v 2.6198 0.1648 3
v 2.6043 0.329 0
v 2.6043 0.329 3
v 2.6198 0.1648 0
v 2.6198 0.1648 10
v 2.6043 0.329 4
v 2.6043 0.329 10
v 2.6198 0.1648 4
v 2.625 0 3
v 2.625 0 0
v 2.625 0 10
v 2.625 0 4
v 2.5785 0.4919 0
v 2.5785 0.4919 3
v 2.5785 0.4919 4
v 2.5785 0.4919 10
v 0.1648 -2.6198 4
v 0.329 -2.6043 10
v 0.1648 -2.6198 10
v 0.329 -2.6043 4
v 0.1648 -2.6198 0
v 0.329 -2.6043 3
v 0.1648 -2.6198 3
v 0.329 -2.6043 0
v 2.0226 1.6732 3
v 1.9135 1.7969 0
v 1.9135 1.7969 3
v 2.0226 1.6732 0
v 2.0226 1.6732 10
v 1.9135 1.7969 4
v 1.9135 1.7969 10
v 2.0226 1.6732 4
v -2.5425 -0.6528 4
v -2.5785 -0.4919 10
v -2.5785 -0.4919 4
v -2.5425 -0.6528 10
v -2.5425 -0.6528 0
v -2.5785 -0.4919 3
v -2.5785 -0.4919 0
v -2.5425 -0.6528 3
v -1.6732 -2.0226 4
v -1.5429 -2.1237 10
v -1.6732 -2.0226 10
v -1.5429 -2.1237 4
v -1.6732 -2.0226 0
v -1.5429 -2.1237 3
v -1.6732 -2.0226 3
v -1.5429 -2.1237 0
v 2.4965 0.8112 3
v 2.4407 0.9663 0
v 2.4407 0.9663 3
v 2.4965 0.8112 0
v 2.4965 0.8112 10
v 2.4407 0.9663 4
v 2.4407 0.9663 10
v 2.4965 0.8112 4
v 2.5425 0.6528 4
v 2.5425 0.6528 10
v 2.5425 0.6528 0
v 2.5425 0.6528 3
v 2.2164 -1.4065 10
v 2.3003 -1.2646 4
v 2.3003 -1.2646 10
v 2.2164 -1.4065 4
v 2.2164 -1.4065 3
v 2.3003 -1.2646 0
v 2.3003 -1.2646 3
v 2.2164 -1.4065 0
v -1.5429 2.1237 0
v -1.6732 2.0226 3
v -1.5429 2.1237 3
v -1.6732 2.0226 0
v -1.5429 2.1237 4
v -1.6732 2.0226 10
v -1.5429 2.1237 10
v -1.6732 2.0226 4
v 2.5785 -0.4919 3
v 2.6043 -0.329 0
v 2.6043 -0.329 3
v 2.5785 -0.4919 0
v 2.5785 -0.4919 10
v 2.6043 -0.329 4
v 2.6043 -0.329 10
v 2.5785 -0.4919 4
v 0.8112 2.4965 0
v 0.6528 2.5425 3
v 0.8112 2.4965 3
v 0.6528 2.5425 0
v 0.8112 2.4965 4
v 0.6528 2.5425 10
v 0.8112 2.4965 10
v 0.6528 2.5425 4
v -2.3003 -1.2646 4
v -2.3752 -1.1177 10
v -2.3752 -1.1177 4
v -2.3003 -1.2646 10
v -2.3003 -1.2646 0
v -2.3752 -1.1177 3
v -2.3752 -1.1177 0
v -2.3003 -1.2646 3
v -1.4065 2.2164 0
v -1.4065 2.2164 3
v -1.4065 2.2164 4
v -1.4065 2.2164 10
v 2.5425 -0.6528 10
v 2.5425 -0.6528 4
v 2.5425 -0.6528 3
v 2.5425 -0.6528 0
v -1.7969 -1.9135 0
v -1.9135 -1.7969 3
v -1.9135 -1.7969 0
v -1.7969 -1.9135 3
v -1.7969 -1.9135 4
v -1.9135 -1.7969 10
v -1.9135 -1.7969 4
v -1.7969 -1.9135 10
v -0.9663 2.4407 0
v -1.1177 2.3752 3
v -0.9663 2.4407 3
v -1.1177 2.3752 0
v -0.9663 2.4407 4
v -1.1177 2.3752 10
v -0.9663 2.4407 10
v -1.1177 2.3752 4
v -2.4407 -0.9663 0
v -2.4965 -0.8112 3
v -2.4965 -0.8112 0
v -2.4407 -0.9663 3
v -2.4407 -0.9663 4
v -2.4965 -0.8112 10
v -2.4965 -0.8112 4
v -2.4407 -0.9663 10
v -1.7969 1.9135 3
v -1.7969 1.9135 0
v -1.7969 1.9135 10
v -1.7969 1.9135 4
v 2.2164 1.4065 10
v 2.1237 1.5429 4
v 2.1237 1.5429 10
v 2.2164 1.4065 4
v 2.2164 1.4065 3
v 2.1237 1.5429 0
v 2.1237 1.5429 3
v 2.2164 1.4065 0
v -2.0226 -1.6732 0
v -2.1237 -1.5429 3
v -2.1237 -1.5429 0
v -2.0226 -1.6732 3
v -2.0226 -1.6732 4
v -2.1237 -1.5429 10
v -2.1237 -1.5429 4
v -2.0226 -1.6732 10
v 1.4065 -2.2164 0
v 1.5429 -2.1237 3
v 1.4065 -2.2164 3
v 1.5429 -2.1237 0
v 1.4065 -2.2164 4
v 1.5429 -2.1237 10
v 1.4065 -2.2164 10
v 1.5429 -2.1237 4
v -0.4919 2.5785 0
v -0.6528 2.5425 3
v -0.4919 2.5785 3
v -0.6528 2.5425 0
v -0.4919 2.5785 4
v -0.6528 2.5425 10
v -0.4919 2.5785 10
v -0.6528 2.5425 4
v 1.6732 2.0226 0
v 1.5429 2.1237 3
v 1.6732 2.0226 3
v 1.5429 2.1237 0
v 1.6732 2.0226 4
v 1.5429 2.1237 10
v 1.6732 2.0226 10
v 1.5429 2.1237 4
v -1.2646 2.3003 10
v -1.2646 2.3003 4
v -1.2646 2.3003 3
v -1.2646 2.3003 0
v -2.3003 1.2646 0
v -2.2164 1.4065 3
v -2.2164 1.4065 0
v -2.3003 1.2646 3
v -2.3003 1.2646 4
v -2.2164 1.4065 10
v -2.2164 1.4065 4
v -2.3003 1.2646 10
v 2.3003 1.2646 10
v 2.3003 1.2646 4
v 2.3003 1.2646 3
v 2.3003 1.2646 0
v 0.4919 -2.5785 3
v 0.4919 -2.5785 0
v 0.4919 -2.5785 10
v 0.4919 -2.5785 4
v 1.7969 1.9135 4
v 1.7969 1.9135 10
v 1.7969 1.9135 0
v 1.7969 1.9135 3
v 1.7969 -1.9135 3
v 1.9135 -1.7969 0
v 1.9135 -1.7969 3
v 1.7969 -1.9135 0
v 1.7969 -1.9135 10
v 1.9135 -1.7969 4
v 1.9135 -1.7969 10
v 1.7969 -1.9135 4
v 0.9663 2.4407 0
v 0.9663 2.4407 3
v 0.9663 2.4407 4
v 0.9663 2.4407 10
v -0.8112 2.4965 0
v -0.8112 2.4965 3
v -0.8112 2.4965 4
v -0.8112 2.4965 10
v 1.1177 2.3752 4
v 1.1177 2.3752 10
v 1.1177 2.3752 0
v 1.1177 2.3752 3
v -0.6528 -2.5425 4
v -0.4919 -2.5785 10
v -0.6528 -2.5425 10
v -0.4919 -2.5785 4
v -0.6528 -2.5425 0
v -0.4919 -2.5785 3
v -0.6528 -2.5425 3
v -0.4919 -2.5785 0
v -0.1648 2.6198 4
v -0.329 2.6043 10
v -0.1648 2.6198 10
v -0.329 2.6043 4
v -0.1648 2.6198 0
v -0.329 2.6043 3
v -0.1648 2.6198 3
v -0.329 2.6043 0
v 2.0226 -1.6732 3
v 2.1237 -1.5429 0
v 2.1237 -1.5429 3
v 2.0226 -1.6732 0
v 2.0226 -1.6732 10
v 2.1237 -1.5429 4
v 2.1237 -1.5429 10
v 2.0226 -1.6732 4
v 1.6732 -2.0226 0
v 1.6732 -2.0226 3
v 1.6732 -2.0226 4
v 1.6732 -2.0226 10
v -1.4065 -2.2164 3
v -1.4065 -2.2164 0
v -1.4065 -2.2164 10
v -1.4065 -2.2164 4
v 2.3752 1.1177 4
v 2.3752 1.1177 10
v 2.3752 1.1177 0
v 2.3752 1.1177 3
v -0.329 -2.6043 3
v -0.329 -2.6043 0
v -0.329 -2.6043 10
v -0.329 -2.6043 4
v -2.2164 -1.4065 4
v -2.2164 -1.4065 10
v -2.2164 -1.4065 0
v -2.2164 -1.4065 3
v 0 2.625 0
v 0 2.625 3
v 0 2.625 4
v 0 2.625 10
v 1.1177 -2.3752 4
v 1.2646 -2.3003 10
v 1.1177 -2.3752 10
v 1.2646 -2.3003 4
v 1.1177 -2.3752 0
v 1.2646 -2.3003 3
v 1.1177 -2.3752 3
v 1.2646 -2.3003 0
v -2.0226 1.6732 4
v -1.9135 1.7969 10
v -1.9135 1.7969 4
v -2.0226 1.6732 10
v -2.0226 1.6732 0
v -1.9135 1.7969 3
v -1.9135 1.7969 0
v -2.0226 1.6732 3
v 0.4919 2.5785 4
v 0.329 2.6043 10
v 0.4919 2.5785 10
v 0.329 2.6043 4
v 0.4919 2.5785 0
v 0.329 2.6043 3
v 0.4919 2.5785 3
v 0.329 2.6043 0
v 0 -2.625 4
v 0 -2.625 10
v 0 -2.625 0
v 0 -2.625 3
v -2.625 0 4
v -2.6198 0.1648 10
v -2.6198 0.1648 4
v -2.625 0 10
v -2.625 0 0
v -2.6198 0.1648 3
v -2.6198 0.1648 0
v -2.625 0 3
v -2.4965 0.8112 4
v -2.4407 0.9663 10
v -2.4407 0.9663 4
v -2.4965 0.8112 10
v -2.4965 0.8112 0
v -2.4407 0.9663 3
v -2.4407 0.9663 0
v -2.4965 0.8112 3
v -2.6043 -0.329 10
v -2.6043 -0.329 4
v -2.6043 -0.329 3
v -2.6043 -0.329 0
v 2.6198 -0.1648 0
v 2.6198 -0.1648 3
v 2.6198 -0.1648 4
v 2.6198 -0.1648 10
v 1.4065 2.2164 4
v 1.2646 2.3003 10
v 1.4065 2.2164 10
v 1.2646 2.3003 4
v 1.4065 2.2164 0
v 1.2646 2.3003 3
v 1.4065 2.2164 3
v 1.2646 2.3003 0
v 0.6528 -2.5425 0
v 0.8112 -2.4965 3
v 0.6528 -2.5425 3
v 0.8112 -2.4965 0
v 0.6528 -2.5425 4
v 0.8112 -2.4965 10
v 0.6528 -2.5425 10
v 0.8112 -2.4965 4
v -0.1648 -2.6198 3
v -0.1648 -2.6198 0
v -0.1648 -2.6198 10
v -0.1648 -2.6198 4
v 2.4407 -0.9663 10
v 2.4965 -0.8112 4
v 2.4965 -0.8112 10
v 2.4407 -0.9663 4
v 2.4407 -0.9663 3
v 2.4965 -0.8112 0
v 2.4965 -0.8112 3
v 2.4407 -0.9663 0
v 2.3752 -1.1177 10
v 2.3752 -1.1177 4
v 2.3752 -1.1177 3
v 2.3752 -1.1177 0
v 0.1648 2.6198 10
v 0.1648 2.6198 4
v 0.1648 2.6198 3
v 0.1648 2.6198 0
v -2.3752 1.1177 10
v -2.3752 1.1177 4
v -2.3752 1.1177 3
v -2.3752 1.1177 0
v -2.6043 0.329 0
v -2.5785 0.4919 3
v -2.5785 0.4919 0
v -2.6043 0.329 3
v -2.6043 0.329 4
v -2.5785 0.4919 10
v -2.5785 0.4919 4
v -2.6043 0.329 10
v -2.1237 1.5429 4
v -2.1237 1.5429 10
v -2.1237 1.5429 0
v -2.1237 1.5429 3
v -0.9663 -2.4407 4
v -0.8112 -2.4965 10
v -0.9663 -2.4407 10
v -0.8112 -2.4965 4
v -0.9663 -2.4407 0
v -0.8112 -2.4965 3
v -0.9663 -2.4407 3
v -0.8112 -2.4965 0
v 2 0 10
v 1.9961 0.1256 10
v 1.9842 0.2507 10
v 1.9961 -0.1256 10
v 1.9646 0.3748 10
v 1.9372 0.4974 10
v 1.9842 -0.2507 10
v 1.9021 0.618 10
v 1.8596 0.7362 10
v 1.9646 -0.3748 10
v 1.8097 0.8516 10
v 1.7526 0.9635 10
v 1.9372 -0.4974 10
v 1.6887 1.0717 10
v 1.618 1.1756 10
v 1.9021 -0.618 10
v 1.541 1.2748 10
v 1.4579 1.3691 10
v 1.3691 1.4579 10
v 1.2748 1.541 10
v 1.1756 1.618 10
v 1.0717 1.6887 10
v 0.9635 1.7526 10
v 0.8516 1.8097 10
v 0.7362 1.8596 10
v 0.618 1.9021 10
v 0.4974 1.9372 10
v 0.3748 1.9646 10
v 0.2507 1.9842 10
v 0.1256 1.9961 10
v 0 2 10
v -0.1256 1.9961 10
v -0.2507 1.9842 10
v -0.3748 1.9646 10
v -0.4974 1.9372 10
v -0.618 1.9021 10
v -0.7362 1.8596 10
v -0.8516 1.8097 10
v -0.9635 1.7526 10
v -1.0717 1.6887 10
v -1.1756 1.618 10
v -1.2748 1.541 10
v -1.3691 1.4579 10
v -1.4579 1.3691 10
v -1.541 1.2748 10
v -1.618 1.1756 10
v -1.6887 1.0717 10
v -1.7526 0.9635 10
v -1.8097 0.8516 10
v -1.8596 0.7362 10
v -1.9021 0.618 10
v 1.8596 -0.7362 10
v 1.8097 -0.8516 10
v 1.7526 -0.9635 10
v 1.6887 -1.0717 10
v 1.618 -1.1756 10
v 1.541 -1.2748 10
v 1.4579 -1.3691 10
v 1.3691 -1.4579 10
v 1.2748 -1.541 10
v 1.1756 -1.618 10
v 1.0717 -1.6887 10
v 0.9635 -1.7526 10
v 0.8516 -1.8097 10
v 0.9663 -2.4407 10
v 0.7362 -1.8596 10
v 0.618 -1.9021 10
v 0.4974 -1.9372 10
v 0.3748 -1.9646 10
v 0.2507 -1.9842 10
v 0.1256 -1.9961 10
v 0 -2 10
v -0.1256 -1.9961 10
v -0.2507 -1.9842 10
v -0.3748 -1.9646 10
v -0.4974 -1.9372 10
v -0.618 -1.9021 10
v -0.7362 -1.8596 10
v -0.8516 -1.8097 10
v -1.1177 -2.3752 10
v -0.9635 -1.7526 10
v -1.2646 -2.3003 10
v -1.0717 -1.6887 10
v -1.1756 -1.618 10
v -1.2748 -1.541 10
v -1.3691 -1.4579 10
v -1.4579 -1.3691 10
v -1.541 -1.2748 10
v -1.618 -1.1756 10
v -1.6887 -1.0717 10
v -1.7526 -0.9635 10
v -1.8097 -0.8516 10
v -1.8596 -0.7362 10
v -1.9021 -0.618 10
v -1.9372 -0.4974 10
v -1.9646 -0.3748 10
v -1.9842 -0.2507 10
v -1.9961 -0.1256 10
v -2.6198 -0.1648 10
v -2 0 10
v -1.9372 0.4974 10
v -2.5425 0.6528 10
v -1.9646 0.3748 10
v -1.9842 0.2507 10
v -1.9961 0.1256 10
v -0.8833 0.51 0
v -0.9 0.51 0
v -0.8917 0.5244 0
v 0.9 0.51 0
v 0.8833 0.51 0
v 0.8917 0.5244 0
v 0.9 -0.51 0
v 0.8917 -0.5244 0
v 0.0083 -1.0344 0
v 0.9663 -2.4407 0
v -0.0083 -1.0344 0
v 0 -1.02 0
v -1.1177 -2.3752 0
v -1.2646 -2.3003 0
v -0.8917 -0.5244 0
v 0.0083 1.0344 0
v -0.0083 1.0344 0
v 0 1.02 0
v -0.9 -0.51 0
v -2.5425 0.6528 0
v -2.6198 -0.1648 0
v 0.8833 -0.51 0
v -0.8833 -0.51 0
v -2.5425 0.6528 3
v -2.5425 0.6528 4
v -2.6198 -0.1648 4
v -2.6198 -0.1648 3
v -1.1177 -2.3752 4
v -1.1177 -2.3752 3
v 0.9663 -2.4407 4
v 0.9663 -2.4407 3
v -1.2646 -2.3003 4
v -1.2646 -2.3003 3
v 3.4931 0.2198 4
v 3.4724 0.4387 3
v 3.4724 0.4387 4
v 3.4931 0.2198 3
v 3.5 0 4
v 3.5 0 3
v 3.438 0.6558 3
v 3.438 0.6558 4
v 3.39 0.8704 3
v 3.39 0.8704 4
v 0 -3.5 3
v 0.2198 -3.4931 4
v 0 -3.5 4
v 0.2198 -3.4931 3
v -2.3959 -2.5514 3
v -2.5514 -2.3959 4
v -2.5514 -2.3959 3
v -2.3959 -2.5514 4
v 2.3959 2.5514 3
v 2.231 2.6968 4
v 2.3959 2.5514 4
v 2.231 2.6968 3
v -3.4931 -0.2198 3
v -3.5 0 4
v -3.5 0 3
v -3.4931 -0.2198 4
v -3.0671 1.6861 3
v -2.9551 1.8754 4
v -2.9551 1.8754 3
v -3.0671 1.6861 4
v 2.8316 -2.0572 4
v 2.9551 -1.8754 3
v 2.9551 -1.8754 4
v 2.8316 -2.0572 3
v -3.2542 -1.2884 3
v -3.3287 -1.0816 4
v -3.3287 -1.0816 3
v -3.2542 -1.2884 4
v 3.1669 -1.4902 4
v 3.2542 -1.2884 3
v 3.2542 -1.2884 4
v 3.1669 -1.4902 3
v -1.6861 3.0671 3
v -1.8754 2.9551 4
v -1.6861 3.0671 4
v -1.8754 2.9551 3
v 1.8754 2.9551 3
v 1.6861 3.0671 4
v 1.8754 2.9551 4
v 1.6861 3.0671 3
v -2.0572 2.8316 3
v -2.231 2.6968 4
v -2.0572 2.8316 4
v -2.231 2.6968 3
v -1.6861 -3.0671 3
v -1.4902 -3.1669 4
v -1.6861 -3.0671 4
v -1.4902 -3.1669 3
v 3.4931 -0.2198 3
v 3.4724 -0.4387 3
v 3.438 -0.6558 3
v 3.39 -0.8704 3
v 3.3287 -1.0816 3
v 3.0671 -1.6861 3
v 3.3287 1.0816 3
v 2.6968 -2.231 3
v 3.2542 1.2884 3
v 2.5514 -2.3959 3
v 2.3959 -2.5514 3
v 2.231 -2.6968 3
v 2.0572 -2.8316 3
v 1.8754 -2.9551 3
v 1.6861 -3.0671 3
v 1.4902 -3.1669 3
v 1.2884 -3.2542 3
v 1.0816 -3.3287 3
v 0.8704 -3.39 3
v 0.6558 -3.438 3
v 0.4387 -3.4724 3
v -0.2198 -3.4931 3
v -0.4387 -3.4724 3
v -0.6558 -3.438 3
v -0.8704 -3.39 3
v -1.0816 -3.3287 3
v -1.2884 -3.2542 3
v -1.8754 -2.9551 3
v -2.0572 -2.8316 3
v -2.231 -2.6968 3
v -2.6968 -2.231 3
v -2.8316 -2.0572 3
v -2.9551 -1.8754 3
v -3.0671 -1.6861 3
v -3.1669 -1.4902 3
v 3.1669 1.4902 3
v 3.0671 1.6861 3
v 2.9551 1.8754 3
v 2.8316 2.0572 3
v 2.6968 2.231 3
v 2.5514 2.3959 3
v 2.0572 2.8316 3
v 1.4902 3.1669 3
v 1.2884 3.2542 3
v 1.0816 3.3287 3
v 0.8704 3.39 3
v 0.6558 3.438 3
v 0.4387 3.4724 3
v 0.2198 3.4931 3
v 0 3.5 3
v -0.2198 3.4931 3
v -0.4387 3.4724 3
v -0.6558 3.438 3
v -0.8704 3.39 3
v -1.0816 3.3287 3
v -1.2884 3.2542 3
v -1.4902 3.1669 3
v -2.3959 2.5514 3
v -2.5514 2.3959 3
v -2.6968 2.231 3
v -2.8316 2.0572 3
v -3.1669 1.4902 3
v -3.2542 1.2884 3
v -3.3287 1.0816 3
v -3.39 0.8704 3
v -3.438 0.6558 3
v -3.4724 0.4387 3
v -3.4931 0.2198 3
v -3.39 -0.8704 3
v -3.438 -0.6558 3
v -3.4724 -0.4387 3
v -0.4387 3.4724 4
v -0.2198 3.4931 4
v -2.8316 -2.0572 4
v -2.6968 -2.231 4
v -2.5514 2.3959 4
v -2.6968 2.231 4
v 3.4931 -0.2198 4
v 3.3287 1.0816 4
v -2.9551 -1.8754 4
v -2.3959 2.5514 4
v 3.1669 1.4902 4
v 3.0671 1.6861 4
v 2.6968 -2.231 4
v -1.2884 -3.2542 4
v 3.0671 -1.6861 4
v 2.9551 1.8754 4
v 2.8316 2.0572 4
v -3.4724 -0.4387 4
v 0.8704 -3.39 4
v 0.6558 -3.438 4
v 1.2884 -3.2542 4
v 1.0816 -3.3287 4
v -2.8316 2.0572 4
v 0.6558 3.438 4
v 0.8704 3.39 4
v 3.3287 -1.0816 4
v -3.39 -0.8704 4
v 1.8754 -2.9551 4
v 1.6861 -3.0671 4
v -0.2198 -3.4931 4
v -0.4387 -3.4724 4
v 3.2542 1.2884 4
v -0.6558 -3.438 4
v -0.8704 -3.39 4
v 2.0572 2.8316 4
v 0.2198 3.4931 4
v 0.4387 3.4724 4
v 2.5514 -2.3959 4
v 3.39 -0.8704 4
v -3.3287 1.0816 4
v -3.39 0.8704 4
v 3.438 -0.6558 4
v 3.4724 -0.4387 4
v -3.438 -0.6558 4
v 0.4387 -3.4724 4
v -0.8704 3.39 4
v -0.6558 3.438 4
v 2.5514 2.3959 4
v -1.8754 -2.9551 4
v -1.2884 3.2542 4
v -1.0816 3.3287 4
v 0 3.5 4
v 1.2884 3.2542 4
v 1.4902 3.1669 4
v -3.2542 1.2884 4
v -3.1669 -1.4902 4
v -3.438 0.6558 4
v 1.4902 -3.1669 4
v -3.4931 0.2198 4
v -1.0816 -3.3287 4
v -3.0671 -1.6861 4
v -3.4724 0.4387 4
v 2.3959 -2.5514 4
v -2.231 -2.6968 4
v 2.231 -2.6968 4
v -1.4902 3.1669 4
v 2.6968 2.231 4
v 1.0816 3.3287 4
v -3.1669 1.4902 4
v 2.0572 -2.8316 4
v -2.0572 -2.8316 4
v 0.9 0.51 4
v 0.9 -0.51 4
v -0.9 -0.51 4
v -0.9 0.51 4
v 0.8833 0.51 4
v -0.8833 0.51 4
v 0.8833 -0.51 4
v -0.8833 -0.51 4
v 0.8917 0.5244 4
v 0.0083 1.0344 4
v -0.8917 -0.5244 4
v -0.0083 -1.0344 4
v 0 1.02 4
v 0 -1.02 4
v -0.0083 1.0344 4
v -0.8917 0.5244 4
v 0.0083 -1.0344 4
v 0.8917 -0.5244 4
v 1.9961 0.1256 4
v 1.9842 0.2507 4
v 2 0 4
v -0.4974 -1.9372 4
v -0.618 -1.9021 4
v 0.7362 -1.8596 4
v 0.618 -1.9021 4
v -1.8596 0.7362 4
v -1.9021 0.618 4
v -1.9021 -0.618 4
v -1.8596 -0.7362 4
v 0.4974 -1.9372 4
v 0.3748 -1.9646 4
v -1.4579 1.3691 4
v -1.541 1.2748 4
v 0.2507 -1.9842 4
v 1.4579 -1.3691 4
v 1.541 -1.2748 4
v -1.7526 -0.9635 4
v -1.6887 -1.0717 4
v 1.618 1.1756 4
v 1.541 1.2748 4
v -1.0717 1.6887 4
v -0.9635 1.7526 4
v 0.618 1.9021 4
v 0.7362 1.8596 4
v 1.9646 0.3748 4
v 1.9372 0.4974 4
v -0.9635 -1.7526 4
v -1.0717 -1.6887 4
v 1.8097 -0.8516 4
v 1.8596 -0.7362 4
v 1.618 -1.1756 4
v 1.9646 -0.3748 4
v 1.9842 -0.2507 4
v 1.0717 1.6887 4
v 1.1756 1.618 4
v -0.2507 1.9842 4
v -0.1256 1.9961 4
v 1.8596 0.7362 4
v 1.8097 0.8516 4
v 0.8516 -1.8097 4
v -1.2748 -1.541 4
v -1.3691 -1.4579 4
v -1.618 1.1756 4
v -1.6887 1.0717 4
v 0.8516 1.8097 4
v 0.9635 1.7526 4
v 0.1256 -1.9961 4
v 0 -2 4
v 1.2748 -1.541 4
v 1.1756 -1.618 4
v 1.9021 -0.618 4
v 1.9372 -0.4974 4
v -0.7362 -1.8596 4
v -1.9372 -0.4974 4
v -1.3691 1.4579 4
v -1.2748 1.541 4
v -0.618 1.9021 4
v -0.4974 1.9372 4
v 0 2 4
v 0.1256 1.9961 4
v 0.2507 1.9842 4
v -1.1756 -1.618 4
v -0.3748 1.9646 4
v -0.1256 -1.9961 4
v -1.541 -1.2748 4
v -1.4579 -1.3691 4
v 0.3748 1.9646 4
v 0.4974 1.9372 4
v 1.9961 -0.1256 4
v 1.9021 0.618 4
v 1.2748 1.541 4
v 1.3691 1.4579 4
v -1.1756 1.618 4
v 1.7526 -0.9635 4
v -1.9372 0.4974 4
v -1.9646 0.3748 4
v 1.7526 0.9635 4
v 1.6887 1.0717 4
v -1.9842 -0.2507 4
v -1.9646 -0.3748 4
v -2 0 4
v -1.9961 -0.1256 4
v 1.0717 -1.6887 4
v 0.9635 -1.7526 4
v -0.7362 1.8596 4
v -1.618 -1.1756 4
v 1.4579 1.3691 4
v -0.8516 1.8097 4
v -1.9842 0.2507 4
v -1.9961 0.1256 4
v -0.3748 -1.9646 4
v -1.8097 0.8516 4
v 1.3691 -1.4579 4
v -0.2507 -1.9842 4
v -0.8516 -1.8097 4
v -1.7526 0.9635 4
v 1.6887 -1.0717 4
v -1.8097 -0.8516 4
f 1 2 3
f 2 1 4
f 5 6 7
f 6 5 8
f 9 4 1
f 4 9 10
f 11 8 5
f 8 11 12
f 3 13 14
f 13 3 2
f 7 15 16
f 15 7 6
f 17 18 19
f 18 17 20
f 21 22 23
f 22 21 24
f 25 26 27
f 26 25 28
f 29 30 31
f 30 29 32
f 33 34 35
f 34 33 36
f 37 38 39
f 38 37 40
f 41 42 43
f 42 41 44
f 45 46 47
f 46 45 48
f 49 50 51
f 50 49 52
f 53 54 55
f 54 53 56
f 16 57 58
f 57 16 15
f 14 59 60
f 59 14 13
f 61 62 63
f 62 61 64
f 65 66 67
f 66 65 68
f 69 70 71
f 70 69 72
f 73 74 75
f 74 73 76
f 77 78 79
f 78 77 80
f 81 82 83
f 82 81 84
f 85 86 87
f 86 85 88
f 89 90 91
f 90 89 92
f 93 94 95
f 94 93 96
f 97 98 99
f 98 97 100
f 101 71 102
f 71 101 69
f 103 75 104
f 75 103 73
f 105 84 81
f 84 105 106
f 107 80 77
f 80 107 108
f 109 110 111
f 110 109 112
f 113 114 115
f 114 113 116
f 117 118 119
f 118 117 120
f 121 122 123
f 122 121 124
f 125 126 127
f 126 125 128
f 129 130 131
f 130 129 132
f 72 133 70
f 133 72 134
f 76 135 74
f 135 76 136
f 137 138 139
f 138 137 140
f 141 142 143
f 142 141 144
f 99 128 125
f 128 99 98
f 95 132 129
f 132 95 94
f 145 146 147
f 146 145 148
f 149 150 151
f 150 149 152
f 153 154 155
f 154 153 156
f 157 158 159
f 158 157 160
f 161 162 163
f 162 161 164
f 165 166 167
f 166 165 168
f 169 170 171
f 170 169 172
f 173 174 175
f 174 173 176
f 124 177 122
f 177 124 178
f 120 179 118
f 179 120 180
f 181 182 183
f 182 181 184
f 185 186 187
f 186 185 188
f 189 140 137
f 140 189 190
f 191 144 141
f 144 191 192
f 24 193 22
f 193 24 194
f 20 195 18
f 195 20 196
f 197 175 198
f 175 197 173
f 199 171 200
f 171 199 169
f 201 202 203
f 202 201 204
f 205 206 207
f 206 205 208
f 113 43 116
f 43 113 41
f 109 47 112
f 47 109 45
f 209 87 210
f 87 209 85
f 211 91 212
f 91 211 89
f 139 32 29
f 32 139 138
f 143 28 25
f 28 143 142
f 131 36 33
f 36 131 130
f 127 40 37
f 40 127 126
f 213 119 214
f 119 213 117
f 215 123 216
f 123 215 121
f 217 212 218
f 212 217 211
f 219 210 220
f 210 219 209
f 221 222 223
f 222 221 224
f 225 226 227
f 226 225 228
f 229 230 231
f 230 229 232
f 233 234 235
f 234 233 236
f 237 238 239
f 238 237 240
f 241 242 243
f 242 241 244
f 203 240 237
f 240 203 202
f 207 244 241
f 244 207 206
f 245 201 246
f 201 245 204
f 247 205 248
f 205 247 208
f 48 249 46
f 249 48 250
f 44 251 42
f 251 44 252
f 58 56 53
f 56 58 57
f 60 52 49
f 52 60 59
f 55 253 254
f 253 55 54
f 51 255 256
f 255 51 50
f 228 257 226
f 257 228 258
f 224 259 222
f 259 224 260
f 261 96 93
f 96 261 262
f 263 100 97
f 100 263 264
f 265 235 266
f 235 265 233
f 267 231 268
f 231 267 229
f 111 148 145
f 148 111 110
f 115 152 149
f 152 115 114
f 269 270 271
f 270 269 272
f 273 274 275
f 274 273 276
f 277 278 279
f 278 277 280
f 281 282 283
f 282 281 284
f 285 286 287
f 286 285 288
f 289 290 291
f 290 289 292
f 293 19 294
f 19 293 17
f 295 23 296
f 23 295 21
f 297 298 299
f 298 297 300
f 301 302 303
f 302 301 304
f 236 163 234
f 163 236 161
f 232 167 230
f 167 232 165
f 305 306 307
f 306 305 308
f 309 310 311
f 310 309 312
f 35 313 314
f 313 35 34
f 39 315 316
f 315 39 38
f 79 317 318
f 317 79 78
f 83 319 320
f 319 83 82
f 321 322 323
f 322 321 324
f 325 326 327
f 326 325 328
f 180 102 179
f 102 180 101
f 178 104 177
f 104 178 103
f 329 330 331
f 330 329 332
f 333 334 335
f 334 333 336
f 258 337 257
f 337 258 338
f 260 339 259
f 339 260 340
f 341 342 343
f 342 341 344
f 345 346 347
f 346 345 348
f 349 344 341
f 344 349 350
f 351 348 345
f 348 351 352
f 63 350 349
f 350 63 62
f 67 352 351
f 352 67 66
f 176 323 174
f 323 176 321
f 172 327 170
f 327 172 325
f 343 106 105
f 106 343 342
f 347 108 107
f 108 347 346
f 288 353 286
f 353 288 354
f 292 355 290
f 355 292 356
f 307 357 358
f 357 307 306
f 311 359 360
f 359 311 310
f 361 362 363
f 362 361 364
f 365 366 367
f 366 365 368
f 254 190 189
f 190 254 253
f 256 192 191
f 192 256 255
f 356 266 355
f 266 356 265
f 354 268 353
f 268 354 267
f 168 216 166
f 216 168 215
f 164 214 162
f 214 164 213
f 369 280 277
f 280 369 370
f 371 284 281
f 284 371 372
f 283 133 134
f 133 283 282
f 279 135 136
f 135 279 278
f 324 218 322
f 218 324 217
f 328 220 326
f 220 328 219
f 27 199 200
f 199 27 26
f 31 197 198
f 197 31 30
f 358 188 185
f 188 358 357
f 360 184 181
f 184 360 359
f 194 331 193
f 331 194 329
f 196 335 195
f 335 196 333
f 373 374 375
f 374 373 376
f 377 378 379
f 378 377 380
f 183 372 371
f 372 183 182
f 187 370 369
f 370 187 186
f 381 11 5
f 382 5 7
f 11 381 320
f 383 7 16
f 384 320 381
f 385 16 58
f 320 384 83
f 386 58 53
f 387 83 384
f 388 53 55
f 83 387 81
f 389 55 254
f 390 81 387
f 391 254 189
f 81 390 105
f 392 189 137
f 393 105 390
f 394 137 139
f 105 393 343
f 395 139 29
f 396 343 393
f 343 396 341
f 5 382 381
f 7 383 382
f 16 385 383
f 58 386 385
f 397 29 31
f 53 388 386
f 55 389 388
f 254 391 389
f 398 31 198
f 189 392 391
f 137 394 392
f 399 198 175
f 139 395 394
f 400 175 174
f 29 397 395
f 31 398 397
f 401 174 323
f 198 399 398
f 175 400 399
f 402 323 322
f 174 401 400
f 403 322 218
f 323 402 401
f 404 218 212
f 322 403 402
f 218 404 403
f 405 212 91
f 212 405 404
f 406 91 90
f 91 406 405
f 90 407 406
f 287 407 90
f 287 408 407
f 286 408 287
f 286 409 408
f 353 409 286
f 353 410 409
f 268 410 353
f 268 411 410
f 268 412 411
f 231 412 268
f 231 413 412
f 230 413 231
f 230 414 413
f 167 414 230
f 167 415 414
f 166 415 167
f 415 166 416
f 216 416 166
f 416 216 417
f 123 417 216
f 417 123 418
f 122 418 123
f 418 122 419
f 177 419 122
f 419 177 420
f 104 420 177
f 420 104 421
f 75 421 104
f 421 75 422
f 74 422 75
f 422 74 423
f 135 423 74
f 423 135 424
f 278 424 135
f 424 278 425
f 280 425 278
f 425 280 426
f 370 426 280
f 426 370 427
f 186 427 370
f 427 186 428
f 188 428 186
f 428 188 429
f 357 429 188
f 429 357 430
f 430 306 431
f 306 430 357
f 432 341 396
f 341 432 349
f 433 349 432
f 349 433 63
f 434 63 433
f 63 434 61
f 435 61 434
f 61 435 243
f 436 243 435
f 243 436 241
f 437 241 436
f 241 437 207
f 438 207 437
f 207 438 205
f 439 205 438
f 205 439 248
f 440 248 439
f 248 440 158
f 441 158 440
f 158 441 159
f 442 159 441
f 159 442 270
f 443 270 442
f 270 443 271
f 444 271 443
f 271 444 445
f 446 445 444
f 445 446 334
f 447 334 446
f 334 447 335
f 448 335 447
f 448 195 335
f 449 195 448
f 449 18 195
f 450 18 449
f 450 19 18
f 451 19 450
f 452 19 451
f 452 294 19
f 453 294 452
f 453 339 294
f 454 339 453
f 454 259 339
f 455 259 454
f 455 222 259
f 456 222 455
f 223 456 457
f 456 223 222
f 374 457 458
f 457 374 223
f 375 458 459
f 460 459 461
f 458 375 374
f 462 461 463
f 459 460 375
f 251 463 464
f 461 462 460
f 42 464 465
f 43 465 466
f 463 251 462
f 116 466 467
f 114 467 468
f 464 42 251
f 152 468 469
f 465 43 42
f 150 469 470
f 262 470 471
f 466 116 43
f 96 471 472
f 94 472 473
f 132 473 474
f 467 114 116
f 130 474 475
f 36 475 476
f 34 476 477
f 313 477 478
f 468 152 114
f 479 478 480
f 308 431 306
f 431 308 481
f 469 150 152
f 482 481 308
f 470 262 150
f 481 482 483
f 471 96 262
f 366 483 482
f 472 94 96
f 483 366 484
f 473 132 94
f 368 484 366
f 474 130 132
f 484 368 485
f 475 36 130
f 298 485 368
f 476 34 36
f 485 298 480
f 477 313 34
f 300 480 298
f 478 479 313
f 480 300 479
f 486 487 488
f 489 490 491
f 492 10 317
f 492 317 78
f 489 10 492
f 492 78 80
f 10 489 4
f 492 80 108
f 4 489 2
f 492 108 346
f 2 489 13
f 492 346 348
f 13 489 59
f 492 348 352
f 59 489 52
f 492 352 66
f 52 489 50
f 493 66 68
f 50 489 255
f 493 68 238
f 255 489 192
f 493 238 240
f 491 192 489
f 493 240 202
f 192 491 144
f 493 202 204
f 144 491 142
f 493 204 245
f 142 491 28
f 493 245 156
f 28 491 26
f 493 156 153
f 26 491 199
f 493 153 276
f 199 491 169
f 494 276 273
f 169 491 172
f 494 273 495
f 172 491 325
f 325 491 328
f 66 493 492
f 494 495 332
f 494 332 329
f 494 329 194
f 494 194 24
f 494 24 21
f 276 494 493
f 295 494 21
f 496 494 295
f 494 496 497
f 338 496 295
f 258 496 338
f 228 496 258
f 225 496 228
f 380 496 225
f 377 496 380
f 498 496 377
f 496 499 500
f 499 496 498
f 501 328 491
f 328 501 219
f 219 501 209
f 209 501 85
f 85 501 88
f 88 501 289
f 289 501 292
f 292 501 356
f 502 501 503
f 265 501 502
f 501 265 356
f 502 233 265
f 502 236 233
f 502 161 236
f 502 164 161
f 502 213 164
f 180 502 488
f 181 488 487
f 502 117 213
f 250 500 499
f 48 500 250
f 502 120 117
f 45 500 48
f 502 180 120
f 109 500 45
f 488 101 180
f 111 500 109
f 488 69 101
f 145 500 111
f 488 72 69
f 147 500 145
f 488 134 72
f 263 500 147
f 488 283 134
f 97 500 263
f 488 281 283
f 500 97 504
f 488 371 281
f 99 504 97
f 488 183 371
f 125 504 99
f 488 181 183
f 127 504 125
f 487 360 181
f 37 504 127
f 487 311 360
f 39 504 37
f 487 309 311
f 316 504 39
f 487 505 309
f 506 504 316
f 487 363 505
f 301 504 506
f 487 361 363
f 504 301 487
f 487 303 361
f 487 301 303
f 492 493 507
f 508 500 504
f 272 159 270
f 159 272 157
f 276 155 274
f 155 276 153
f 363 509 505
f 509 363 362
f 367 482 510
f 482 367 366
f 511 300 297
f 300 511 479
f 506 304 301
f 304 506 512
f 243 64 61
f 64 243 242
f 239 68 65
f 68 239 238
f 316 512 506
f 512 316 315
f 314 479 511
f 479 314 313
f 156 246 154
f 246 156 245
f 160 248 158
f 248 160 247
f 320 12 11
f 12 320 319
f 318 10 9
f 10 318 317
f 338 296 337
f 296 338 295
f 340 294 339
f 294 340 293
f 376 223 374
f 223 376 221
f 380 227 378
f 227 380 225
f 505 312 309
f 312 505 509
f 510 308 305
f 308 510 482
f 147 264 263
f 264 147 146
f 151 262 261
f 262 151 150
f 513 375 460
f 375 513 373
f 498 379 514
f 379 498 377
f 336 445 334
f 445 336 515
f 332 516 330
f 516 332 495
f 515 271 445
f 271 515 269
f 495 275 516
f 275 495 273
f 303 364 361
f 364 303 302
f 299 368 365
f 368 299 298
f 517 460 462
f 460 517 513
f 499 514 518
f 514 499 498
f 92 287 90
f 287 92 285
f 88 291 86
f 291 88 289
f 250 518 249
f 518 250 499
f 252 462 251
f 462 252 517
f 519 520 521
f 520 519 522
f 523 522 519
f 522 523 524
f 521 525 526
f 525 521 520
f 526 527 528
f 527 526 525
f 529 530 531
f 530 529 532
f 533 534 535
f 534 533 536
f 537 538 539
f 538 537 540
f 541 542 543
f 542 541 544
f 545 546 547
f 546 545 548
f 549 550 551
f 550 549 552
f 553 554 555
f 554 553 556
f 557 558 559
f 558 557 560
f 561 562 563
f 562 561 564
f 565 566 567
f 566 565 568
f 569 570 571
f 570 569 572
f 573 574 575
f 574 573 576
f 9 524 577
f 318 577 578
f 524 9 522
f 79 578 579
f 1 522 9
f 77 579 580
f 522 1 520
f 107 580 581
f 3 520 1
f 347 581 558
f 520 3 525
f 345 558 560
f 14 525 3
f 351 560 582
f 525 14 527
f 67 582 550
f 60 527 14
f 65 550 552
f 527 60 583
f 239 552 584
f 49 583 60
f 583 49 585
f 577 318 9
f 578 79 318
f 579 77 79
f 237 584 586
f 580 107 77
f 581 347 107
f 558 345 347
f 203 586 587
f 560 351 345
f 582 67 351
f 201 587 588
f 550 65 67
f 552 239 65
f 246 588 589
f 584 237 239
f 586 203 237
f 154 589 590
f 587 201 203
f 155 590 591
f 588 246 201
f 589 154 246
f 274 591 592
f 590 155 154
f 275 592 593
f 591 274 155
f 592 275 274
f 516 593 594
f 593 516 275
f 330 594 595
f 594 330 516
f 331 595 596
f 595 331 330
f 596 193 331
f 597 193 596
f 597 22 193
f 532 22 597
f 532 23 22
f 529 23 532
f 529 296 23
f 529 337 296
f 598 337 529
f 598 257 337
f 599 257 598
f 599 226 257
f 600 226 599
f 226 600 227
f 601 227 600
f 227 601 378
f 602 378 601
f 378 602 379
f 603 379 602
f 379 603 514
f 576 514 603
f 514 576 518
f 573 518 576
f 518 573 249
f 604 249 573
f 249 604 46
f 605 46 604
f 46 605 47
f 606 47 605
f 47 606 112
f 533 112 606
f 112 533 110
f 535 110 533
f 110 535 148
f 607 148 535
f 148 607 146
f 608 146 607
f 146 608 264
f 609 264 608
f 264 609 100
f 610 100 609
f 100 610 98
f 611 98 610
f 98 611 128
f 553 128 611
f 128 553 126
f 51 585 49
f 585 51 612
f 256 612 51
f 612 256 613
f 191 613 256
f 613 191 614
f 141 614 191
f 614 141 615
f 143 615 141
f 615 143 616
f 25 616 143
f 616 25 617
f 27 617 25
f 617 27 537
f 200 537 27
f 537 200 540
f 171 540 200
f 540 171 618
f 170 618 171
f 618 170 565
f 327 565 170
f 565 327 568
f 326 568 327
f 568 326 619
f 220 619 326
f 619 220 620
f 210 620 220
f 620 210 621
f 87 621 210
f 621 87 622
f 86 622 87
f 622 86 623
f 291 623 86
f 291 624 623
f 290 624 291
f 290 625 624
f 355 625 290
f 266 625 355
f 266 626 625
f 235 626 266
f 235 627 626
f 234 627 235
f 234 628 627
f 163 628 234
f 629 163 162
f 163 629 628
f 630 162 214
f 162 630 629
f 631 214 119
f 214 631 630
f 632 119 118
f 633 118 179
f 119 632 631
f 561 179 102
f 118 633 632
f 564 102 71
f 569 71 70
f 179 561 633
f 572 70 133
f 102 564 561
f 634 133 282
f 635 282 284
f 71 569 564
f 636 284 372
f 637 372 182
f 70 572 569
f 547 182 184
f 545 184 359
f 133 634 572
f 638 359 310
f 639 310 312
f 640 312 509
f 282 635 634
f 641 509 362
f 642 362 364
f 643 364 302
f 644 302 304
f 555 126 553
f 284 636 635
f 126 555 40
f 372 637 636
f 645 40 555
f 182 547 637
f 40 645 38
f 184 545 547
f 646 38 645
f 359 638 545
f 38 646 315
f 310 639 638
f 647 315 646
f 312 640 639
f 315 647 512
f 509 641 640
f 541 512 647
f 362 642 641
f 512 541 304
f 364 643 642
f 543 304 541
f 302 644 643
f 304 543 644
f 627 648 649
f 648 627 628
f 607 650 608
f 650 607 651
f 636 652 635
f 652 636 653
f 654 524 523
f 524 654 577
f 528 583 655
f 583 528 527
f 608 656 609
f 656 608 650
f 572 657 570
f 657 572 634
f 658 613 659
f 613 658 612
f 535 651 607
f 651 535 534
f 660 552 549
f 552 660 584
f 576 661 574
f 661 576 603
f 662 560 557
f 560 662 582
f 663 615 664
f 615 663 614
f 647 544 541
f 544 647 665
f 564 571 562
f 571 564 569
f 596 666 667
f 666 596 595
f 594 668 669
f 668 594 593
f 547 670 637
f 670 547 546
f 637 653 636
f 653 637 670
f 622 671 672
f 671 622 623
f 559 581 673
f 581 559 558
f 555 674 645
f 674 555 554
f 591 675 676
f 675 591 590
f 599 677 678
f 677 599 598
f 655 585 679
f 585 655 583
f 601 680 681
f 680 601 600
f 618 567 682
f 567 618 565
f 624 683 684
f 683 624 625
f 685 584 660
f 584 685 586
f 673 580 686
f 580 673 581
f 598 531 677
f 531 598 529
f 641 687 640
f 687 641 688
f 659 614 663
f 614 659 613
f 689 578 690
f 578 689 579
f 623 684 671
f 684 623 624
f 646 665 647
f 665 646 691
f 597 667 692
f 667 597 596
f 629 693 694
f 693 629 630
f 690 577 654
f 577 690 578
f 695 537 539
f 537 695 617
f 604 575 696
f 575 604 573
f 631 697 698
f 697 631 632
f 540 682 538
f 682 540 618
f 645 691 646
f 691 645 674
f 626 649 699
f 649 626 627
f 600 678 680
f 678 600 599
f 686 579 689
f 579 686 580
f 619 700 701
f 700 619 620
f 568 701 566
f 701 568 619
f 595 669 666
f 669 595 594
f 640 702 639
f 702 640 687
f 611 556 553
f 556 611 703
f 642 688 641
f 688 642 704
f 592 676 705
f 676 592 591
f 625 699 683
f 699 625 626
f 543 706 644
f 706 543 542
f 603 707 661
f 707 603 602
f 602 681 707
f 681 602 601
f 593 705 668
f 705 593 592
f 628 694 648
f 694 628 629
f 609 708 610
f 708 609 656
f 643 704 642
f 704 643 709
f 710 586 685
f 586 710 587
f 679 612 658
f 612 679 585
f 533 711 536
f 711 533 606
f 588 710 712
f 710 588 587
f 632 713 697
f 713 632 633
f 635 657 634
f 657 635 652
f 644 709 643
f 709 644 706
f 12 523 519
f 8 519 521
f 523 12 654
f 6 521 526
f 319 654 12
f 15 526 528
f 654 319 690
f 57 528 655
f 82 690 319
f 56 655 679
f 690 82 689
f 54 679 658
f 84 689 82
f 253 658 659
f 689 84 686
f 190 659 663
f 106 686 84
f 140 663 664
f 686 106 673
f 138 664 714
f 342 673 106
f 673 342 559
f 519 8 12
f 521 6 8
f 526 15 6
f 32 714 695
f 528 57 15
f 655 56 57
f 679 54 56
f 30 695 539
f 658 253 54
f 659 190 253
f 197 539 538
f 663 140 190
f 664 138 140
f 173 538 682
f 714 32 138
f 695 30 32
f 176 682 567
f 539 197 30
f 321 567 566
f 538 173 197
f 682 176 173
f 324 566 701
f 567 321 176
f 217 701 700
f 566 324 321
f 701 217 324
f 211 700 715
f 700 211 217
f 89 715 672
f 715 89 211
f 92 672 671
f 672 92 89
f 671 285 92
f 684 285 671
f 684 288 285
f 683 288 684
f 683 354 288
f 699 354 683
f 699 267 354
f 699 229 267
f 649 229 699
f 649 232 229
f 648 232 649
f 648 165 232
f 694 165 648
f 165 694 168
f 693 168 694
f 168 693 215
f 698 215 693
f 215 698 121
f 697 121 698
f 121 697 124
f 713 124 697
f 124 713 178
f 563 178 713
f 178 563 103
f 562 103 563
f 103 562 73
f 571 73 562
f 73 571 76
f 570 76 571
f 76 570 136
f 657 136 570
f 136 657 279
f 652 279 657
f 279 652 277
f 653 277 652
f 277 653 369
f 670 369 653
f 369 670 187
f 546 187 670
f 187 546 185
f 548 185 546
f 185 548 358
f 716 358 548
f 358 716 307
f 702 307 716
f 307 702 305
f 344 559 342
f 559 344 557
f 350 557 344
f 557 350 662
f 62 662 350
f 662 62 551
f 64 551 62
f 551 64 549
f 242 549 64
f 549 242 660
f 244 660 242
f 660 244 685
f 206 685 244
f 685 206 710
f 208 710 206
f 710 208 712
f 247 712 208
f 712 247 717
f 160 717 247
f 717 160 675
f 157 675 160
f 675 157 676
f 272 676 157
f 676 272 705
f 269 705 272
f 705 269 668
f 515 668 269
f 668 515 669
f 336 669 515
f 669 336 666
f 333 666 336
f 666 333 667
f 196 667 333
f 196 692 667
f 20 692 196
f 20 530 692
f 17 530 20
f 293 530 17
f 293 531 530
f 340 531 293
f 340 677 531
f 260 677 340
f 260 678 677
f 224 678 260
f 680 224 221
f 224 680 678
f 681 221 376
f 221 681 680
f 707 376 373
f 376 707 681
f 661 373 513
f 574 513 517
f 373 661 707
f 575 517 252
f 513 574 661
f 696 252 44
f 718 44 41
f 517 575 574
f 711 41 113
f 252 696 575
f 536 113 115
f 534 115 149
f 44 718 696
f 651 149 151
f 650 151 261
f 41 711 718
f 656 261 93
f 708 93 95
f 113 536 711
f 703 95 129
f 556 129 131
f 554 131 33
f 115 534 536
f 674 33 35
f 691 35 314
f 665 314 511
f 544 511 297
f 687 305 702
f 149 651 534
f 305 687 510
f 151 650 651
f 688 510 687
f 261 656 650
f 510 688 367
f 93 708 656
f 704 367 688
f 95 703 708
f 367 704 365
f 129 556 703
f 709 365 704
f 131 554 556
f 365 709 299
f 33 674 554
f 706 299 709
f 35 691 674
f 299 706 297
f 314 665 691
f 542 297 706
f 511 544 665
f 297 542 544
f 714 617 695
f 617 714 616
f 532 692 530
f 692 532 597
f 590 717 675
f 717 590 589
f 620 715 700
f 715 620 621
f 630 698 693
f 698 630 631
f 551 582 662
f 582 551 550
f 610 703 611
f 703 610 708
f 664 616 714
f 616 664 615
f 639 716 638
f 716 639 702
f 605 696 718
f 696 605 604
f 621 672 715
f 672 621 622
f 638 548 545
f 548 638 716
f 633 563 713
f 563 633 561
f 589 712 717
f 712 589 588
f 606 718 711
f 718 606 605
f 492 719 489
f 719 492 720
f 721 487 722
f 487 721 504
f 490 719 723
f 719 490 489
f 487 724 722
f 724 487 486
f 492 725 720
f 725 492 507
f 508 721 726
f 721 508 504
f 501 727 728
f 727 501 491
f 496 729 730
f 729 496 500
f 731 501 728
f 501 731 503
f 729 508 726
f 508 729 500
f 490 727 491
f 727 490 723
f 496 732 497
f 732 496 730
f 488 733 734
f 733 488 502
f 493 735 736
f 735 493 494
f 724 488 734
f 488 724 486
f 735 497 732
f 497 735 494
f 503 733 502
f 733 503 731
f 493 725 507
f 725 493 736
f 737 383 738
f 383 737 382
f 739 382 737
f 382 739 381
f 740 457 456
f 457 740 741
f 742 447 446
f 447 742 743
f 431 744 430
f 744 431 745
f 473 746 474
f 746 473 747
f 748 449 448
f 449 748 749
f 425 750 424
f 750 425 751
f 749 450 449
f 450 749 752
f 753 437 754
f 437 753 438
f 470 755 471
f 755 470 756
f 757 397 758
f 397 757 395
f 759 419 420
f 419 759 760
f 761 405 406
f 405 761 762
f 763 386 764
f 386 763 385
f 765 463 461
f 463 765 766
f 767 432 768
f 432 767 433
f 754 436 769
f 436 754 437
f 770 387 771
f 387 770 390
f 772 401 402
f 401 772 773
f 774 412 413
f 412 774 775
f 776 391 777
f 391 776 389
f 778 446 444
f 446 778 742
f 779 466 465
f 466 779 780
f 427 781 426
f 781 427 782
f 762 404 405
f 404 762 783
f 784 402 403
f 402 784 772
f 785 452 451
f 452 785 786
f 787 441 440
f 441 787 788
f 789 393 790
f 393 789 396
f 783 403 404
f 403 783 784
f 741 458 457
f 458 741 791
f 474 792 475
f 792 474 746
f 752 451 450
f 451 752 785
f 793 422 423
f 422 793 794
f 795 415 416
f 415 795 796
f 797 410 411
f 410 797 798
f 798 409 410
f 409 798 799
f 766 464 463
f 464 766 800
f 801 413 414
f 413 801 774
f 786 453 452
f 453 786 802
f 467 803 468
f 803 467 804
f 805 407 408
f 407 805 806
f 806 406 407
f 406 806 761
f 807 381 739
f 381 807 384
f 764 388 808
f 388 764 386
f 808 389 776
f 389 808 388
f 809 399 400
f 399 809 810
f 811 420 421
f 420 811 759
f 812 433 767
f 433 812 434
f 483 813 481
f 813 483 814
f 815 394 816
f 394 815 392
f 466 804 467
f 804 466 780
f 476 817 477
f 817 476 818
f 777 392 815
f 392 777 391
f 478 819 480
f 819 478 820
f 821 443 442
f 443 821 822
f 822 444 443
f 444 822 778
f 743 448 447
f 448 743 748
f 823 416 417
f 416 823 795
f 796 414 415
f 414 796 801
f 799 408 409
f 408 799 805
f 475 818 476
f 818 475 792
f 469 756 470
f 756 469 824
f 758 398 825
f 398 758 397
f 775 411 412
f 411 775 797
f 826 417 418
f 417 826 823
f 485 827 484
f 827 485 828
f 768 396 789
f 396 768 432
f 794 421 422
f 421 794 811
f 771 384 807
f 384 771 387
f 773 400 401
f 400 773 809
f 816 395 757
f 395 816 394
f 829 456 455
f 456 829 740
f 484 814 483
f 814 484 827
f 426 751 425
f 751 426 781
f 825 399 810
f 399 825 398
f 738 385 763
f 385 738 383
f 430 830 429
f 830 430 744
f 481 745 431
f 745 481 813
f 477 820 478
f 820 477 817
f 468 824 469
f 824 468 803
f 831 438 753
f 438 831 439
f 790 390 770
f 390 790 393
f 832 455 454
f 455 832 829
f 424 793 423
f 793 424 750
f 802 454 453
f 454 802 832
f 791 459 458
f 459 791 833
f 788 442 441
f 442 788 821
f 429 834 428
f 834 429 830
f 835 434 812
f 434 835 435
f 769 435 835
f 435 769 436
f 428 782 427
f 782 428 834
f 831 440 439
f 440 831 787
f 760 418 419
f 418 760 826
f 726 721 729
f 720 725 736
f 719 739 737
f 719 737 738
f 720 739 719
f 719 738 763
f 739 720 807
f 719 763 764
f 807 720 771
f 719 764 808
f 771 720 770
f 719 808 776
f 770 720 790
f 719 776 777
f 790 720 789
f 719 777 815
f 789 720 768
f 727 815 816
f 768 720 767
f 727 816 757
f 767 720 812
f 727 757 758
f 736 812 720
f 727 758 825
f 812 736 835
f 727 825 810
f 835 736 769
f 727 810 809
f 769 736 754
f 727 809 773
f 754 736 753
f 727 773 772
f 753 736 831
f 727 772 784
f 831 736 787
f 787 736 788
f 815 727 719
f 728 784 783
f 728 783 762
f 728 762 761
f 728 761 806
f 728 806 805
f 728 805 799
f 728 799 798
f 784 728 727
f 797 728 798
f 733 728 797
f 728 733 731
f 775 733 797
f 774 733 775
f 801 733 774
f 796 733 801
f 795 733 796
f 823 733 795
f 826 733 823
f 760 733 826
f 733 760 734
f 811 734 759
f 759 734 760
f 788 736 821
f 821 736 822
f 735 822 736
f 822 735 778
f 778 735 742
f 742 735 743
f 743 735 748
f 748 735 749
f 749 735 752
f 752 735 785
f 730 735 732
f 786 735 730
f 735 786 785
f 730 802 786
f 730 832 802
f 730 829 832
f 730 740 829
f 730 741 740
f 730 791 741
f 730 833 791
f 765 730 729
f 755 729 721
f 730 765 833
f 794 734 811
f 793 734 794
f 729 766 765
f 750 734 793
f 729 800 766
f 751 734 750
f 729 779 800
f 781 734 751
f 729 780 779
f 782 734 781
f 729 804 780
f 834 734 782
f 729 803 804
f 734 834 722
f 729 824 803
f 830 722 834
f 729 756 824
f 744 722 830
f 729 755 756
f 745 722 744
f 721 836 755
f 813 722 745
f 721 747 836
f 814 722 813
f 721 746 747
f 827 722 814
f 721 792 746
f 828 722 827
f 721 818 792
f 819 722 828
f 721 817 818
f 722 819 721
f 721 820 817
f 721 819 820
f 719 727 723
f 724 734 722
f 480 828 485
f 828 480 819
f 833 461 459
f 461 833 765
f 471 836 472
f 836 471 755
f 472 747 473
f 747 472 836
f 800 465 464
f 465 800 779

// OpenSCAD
$fn=100;


r=5.25/2;

// Hexagon
n = 1.02; // Side length
hexWidth = 1.8;


difference(){
    union(){
        cylinder(10, r, r);
        translate([0, 0, 3]){
            cylinder(1 , 3.5, 3.5);
        };
    }

    union(){
        rotate([0,0,0]){
            translate([-hexWidth/2, -n/2, 0]){
                cube([hexWidth, n, 14]);
            };
        };
        rotate([0,0,60]){
            translate([-hexWidth/2, -n/2, 0]){
                cube([hexWidth, n, 14]);
            };
        };
        rotate([0,0,120]){
            translate([-hexWidth/2, -n/2, 0]){
                cube([hexWidth, n, 14]);
            };
        };
    };
    translate([0, 0, 4]){
        cylinder(6,2,2);
    };
};
